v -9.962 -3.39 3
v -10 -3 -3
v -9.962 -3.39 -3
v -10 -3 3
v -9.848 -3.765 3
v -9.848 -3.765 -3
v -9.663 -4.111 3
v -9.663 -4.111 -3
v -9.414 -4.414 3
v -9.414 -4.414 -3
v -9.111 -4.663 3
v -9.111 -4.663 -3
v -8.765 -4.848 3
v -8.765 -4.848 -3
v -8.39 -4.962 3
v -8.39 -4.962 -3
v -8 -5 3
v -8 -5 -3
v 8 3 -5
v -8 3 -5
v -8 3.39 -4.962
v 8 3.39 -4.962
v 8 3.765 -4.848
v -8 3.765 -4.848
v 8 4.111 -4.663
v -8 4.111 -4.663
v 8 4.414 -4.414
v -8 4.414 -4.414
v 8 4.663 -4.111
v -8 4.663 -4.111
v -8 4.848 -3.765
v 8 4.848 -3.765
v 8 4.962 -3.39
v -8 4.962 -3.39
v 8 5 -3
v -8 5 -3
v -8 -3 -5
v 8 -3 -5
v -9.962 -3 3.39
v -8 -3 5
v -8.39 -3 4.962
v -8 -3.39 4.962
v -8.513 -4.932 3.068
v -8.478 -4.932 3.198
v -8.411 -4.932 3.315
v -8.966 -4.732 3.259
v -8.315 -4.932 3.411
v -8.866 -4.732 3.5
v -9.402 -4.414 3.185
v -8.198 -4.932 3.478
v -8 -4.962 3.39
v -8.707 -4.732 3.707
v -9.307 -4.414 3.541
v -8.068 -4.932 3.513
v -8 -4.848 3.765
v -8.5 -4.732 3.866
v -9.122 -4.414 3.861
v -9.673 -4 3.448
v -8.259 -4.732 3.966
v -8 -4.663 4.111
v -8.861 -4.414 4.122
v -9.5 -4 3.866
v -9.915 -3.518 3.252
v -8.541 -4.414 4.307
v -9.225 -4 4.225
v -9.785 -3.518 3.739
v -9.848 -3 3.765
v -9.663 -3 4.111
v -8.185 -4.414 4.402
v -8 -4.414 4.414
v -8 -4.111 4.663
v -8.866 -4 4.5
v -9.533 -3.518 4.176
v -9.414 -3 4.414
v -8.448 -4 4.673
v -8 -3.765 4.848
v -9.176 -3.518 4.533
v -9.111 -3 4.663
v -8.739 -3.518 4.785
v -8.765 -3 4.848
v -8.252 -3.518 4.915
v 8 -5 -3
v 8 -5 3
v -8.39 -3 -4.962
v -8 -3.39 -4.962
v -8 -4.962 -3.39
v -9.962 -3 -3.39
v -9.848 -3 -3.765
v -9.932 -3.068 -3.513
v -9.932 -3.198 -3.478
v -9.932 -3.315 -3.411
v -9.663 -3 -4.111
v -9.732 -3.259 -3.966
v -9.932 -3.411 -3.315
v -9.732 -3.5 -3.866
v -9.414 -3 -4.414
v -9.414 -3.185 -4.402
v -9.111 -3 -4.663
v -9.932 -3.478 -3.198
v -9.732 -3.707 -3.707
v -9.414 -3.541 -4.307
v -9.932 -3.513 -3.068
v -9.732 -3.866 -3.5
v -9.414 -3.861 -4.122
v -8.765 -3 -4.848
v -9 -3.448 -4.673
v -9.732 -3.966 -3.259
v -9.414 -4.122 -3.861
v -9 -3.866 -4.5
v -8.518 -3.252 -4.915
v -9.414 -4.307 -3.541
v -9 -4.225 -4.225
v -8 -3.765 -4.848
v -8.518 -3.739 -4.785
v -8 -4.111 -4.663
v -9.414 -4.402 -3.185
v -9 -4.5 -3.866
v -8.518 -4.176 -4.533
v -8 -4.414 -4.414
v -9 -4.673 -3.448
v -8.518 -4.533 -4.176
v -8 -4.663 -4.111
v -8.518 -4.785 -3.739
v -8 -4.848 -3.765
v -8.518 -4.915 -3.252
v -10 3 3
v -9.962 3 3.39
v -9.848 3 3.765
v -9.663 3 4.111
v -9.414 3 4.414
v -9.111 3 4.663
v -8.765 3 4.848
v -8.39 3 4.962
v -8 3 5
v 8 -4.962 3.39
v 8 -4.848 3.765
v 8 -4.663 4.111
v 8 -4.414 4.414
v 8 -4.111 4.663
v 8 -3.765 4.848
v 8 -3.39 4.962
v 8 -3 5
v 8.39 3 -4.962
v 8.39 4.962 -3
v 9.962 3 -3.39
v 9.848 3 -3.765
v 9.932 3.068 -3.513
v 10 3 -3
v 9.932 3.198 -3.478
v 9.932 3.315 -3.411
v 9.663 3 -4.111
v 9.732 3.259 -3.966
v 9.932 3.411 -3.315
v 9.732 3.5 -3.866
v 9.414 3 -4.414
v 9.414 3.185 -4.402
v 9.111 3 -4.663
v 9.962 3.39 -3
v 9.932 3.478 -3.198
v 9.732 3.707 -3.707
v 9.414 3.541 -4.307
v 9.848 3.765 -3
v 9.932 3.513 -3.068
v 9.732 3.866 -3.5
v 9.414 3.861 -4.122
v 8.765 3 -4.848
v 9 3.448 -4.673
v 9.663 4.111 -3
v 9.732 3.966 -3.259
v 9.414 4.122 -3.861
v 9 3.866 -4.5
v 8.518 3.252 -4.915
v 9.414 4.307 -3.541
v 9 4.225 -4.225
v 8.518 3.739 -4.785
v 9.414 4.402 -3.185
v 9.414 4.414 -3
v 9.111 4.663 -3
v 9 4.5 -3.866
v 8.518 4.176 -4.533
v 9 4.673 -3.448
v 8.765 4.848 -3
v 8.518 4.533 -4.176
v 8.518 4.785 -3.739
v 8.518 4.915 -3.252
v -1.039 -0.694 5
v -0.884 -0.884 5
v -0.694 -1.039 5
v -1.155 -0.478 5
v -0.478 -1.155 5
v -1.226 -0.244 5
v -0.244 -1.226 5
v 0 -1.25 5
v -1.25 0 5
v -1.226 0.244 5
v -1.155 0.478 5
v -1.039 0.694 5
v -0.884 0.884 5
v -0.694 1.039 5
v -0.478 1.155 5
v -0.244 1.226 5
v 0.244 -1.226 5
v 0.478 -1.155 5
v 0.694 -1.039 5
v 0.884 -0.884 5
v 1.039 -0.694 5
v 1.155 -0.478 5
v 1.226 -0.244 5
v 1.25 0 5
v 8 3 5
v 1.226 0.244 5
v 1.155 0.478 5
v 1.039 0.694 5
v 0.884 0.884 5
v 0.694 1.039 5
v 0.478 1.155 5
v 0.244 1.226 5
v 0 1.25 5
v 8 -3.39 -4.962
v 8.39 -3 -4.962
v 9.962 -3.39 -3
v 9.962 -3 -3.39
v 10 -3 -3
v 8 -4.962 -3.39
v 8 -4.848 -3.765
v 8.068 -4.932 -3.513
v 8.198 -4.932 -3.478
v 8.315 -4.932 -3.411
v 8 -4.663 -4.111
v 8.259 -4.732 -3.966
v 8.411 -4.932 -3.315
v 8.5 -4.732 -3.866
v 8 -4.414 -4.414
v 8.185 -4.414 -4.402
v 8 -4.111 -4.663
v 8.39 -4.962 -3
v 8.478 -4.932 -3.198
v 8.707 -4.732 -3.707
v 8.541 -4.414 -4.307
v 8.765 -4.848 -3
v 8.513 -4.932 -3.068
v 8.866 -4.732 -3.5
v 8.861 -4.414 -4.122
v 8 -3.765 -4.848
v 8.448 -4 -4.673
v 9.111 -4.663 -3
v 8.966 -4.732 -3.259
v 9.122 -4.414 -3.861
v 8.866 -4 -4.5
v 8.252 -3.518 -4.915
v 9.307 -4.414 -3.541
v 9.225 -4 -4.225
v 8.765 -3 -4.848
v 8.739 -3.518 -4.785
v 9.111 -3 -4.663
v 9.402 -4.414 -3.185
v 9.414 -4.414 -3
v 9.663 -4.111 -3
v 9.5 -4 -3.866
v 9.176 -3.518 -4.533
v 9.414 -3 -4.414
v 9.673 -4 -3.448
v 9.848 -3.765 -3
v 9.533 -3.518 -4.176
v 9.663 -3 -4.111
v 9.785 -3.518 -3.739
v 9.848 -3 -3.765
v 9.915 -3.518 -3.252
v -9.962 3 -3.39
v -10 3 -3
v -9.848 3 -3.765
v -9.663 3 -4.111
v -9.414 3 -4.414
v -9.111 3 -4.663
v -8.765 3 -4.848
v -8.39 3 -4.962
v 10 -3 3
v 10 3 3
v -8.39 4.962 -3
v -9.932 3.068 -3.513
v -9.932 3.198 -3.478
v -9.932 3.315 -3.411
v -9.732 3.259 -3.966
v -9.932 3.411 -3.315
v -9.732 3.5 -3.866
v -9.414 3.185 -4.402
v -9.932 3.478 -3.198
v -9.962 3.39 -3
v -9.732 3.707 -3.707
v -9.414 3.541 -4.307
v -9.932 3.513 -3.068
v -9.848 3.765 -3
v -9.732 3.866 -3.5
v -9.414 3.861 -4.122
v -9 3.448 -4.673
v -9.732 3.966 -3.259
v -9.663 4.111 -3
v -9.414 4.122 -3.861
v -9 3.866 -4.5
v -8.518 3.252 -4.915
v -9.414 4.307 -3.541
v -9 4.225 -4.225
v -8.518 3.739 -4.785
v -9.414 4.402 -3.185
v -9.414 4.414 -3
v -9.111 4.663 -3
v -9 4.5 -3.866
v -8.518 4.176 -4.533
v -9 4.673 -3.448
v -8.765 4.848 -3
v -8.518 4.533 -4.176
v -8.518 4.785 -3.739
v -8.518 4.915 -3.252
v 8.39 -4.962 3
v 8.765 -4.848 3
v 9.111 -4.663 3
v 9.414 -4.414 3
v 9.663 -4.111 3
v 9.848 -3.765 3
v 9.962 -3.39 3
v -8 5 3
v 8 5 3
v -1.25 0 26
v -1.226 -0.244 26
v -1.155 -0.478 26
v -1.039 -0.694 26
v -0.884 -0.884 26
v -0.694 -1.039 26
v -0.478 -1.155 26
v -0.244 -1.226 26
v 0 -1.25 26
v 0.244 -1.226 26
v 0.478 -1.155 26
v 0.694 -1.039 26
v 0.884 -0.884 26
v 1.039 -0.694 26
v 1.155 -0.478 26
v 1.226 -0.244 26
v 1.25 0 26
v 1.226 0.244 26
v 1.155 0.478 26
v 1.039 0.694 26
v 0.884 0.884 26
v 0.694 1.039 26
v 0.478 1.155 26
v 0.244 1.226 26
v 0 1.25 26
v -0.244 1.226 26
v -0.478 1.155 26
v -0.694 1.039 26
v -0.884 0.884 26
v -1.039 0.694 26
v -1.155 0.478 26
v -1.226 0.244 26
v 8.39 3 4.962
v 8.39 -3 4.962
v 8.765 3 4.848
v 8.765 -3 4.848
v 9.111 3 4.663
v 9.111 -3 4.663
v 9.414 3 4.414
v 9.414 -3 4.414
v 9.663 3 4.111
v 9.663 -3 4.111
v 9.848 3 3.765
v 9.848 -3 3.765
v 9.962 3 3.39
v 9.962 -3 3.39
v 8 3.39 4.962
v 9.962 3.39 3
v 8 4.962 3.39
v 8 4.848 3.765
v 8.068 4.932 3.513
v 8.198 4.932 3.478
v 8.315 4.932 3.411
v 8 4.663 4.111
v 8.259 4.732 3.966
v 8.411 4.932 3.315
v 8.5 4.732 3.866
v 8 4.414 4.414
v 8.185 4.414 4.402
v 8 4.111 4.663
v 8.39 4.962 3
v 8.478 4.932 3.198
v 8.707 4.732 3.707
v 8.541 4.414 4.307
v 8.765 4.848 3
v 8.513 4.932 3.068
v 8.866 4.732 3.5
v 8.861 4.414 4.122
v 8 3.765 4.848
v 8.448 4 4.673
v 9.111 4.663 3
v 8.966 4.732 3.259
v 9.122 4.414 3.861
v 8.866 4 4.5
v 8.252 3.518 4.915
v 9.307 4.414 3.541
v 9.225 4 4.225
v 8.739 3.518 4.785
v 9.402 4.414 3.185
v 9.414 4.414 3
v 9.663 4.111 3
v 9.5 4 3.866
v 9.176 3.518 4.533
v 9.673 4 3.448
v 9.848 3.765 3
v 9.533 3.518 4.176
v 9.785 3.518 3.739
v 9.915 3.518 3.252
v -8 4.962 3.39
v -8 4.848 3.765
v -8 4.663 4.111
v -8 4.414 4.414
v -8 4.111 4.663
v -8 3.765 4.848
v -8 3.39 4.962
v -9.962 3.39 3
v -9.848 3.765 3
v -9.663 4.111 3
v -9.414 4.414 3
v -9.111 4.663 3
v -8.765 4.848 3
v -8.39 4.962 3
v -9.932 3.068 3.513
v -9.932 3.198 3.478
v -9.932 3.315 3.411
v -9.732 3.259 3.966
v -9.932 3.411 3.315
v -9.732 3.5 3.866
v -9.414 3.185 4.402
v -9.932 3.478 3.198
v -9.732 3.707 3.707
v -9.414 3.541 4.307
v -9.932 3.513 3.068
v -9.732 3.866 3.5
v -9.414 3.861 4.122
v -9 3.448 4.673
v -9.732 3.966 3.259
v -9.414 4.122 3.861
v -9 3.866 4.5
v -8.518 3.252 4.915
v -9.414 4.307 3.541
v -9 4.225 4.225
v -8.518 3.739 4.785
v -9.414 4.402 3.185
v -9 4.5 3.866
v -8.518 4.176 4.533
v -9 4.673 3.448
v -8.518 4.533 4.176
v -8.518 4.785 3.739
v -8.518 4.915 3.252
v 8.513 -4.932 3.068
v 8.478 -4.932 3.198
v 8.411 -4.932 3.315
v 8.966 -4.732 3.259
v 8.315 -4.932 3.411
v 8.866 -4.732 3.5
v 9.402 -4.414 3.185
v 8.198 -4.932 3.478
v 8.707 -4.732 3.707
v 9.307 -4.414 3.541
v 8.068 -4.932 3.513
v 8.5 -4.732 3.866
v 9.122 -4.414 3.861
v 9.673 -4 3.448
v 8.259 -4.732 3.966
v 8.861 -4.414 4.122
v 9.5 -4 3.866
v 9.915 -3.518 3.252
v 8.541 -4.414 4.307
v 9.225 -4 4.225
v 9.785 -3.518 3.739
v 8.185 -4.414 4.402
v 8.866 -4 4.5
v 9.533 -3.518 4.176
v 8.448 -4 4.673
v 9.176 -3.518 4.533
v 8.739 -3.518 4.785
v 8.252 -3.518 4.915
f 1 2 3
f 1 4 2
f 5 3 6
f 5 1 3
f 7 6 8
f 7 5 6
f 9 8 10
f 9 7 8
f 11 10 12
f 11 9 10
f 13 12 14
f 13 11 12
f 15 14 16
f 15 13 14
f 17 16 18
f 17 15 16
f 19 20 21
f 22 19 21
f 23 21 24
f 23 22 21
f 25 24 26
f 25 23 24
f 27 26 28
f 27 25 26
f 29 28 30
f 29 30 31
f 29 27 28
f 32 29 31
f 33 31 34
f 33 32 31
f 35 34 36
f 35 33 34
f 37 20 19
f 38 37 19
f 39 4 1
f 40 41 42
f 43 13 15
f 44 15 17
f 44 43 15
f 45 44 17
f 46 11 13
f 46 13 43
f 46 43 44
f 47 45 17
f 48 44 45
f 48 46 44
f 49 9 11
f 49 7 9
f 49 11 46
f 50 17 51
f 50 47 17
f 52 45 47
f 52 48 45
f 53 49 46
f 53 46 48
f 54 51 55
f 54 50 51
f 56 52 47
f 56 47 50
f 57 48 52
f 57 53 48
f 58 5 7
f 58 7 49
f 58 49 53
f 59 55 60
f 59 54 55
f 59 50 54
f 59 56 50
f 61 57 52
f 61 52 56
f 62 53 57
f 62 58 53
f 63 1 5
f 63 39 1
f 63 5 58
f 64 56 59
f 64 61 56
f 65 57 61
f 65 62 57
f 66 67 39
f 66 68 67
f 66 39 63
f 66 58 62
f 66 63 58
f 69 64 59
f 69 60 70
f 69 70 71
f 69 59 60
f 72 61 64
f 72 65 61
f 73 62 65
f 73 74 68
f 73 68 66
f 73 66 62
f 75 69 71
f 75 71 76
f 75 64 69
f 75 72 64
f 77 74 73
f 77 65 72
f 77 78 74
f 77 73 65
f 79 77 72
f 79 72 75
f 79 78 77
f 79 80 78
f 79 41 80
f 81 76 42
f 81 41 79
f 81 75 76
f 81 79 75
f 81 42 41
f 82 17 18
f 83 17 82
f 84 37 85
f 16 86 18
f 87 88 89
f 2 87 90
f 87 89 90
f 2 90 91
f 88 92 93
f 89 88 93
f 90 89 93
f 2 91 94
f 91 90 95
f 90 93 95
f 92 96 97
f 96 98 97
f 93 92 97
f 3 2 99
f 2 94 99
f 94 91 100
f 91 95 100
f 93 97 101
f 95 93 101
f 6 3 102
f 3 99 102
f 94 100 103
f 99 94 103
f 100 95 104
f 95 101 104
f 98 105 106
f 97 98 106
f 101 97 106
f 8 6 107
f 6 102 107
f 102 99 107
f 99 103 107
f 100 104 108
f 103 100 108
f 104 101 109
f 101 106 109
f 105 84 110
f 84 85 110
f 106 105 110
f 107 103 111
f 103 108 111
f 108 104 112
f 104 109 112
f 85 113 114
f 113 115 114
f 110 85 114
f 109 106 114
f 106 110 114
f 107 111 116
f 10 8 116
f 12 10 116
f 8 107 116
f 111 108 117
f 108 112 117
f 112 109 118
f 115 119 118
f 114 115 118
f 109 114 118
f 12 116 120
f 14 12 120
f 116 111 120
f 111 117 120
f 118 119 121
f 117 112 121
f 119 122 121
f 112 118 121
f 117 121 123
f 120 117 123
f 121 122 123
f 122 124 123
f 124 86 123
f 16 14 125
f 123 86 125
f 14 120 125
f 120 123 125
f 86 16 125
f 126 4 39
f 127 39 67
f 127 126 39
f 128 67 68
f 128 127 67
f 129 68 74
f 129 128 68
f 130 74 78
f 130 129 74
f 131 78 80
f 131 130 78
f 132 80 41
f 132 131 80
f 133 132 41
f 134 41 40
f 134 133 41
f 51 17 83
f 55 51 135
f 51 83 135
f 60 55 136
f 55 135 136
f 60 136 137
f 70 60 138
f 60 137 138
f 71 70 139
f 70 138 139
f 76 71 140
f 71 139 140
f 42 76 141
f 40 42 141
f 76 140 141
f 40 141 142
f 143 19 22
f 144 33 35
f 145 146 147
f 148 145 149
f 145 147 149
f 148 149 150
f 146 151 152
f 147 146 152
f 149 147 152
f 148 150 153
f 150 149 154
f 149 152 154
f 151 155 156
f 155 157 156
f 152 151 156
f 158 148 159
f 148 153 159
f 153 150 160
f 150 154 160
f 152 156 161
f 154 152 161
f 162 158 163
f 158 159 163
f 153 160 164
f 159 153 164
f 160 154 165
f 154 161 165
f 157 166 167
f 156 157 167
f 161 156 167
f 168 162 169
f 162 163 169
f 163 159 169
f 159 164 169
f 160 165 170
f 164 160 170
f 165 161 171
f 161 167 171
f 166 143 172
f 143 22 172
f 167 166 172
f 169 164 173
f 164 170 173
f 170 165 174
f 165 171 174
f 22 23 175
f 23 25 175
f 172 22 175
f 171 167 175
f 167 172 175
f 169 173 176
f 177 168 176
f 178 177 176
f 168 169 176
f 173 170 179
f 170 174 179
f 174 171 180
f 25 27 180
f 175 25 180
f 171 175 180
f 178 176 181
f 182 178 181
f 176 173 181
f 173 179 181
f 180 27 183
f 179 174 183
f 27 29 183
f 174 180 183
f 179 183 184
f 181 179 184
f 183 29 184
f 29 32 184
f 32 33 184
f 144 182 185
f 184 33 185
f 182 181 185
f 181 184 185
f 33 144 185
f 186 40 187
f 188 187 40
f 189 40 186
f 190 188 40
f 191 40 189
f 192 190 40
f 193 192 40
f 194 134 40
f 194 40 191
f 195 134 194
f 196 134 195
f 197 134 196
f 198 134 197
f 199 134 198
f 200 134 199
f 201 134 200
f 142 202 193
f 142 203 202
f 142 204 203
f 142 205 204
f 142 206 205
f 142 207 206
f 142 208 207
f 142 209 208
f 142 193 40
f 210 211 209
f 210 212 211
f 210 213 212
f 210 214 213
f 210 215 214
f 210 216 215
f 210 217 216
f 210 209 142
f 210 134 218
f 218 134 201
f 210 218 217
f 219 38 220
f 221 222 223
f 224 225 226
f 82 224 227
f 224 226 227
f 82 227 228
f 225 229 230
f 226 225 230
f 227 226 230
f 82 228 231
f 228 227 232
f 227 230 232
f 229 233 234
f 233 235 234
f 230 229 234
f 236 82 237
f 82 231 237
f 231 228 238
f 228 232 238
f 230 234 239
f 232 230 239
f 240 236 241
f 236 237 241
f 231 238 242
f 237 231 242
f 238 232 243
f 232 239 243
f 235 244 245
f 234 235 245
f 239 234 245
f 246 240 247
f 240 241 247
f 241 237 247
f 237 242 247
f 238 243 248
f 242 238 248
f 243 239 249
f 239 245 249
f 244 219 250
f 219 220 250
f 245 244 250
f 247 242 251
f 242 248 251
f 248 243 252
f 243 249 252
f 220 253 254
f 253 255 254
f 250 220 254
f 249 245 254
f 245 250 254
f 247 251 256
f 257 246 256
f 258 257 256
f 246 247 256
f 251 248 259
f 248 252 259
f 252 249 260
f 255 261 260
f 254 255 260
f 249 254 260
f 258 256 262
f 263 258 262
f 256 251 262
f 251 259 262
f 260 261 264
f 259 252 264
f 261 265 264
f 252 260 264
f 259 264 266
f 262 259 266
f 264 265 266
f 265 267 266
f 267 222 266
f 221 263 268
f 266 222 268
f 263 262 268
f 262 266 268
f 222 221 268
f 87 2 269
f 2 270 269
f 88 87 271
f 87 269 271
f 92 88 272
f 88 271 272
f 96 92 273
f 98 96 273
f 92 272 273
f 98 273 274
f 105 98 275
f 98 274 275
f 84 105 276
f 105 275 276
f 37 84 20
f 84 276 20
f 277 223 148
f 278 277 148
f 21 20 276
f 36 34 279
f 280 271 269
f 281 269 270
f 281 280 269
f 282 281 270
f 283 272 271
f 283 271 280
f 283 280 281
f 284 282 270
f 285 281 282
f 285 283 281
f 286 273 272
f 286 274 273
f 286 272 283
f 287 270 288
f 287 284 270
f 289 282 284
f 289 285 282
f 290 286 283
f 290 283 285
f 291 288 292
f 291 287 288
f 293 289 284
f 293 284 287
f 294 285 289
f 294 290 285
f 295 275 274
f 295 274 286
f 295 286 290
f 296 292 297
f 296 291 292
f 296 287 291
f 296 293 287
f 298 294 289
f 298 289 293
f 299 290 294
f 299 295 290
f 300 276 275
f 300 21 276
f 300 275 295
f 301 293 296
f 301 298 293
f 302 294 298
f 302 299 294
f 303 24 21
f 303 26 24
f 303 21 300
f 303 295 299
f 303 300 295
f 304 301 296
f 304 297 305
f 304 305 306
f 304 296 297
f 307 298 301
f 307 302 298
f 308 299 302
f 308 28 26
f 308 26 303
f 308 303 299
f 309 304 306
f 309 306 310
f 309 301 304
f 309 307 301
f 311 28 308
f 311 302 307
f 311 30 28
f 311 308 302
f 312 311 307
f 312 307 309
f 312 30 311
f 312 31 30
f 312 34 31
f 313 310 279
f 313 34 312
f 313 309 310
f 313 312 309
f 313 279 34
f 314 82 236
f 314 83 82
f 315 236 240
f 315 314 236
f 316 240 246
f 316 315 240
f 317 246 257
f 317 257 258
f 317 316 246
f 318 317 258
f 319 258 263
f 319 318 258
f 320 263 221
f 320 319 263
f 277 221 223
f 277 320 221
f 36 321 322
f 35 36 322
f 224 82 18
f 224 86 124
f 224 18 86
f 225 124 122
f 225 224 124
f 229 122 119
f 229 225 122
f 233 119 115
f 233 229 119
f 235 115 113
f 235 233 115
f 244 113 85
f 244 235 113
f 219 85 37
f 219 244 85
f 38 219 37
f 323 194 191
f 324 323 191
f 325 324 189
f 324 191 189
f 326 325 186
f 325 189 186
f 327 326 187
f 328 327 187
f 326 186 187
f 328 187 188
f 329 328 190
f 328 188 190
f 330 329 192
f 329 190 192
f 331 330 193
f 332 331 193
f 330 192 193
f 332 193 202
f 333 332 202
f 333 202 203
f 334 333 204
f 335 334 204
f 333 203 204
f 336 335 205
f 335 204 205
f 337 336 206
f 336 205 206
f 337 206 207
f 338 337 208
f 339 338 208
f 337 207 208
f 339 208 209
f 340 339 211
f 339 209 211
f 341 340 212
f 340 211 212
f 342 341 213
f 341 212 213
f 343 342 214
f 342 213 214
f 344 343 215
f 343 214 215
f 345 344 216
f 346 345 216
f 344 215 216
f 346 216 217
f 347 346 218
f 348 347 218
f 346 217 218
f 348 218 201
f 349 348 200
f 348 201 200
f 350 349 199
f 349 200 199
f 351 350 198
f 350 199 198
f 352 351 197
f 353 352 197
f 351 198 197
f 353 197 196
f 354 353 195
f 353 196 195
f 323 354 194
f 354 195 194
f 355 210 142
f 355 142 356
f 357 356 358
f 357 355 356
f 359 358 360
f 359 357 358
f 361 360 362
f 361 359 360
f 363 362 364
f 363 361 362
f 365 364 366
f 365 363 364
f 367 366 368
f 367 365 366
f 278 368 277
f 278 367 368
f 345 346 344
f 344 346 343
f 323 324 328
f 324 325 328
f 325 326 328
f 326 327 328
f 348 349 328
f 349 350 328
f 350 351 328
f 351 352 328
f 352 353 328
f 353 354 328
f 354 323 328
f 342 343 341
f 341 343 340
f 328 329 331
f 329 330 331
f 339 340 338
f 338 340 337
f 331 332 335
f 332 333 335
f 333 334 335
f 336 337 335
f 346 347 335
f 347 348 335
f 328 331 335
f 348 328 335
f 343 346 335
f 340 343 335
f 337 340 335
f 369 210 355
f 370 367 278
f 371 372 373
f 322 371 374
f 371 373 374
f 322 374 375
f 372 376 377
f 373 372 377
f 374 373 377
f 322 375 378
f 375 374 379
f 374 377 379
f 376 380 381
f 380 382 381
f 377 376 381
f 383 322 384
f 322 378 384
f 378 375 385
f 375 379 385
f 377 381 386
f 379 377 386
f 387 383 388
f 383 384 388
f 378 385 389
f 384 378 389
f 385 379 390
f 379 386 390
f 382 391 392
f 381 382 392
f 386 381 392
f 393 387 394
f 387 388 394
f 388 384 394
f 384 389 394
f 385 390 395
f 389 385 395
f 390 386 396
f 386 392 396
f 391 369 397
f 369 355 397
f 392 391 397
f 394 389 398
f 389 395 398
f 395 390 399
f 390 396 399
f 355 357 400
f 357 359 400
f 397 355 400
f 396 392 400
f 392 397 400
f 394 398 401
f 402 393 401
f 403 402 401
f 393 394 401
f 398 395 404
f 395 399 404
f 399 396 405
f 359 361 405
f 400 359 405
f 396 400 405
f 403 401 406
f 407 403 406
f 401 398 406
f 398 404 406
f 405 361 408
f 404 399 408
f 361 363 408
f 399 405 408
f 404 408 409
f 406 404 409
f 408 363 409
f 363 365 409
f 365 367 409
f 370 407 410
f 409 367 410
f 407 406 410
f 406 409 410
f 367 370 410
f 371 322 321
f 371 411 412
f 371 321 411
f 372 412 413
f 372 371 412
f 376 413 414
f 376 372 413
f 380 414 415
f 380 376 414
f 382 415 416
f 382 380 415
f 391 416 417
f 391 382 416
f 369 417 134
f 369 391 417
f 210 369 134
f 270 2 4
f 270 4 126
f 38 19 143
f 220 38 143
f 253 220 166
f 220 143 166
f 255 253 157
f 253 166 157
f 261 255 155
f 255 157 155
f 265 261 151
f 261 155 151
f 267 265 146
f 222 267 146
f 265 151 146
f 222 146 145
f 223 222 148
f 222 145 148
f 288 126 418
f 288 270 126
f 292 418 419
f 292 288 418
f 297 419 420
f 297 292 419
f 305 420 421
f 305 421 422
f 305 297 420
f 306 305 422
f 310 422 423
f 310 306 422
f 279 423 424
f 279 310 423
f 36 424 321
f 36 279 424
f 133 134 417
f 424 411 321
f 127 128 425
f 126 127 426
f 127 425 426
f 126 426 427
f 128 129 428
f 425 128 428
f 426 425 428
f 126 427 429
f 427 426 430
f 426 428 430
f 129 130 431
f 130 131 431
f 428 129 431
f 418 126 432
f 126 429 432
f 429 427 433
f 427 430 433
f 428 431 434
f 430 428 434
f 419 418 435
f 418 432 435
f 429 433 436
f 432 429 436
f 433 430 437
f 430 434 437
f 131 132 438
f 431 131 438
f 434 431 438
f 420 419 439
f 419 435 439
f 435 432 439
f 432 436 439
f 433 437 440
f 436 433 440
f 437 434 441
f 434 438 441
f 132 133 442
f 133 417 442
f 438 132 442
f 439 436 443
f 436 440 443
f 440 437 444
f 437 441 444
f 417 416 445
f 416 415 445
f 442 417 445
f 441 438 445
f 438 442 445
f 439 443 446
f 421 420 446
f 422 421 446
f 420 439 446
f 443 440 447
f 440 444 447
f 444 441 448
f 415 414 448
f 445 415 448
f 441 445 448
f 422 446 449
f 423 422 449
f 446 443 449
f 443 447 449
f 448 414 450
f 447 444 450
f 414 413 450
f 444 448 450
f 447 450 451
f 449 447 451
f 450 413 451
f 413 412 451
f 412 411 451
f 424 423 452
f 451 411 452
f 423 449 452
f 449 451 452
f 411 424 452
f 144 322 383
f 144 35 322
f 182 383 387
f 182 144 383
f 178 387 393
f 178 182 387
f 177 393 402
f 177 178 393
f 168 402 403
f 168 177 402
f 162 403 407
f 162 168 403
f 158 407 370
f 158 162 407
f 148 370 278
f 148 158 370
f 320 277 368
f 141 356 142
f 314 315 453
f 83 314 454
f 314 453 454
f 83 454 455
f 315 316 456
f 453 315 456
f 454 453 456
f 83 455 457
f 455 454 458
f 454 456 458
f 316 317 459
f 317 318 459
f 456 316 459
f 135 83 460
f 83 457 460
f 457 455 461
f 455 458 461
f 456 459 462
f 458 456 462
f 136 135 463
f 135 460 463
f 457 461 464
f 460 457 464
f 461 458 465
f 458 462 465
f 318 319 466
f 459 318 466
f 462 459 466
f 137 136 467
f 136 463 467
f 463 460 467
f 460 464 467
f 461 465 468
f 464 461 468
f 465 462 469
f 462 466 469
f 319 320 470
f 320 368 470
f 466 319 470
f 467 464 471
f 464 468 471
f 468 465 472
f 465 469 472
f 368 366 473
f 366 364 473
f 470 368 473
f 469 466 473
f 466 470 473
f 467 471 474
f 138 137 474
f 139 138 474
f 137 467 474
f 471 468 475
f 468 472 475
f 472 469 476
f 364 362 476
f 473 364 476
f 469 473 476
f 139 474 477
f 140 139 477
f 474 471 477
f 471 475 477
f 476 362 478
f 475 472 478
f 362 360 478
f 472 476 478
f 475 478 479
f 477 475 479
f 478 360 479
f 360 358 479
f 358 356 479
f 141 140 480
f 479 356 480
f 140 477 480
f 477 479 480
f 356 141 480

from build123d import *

# Parameters (mm, degrees)
SKETCH5_W               = 20
SKETCH5_H               = 10
BOSS_EXTRUDE2_DEPTH     = 5
CUT_EXTRUDE2_DEPTH      = 13.247448714
CUT_EXTRUDE2_DEPTH_BACK = 13.247448714
SKETCH6_R               = 1.25
FILLET3_R               = 2
SKETCH7_W               = 1.25
SKETCH7_H               = 31


with BuildPart() as part:
    # Sketch5 → Boss-Extrude2 (new, symmetric)
    with BuildSketch(Plane.XY):
        Rectangle(SKETCH5_W, SKETCH5_H)
    extrude(amount=BOSS_EXTRUDE2_DEPTH, both=True)

    # Sketch6 → Cut-Extrude2 (cut, two sides: drawn at the far end of the back side and taken through both)
    with BuildSketch(Plane.XY.offset(-CUT_EXTRUDE2_DEPTH_BACK)):
        Circle(SKETCH6_R)
    extrude(amount=CUT_EXTRUDE2_DEPTH + CUT_EXTRUDE2_DEPTH_BACK, mode=Mode.SUBTRACT)

    # Fillet3
    fillet3_edges = [part.edges().sort_by_distance(p)[0] for p in [
        (10, 0, 5),
        (0, 5, 5),
        (-10, 0, 5),
        (0, 5, -5),
        (10, 0, -5),
        (0, -5, -5),
        (-10, 0, -5),
        (-10, 5, 0),
        (10, 5, 0),
        (10, -5, 0),
        (-10, -5, 0),
        (0, -5, 5),
    ]]
    fillet(fillet3_edges, radius=FILLET3_R)

    # Sketch7 → Revolve1 (revolve)
    with BuildSketch(Plane(origin=(0, 0, 0), x_dir=(1, 0, 0), z_dir=(0, 1, 0)), mode=Mode.PRIVATE) as revolve1_sk:
        with Locations((0.625, -10.5)):
            Rectangle(SKETCH7_W, SKETCH7_H)
    revolve(revolve1_sk.sketch.rotate(Axis((0, 0, -5), (0, 0, 1)), 180), axis=Axis((0, 0, -5), (0, 0, 1)))


solid = part.part
